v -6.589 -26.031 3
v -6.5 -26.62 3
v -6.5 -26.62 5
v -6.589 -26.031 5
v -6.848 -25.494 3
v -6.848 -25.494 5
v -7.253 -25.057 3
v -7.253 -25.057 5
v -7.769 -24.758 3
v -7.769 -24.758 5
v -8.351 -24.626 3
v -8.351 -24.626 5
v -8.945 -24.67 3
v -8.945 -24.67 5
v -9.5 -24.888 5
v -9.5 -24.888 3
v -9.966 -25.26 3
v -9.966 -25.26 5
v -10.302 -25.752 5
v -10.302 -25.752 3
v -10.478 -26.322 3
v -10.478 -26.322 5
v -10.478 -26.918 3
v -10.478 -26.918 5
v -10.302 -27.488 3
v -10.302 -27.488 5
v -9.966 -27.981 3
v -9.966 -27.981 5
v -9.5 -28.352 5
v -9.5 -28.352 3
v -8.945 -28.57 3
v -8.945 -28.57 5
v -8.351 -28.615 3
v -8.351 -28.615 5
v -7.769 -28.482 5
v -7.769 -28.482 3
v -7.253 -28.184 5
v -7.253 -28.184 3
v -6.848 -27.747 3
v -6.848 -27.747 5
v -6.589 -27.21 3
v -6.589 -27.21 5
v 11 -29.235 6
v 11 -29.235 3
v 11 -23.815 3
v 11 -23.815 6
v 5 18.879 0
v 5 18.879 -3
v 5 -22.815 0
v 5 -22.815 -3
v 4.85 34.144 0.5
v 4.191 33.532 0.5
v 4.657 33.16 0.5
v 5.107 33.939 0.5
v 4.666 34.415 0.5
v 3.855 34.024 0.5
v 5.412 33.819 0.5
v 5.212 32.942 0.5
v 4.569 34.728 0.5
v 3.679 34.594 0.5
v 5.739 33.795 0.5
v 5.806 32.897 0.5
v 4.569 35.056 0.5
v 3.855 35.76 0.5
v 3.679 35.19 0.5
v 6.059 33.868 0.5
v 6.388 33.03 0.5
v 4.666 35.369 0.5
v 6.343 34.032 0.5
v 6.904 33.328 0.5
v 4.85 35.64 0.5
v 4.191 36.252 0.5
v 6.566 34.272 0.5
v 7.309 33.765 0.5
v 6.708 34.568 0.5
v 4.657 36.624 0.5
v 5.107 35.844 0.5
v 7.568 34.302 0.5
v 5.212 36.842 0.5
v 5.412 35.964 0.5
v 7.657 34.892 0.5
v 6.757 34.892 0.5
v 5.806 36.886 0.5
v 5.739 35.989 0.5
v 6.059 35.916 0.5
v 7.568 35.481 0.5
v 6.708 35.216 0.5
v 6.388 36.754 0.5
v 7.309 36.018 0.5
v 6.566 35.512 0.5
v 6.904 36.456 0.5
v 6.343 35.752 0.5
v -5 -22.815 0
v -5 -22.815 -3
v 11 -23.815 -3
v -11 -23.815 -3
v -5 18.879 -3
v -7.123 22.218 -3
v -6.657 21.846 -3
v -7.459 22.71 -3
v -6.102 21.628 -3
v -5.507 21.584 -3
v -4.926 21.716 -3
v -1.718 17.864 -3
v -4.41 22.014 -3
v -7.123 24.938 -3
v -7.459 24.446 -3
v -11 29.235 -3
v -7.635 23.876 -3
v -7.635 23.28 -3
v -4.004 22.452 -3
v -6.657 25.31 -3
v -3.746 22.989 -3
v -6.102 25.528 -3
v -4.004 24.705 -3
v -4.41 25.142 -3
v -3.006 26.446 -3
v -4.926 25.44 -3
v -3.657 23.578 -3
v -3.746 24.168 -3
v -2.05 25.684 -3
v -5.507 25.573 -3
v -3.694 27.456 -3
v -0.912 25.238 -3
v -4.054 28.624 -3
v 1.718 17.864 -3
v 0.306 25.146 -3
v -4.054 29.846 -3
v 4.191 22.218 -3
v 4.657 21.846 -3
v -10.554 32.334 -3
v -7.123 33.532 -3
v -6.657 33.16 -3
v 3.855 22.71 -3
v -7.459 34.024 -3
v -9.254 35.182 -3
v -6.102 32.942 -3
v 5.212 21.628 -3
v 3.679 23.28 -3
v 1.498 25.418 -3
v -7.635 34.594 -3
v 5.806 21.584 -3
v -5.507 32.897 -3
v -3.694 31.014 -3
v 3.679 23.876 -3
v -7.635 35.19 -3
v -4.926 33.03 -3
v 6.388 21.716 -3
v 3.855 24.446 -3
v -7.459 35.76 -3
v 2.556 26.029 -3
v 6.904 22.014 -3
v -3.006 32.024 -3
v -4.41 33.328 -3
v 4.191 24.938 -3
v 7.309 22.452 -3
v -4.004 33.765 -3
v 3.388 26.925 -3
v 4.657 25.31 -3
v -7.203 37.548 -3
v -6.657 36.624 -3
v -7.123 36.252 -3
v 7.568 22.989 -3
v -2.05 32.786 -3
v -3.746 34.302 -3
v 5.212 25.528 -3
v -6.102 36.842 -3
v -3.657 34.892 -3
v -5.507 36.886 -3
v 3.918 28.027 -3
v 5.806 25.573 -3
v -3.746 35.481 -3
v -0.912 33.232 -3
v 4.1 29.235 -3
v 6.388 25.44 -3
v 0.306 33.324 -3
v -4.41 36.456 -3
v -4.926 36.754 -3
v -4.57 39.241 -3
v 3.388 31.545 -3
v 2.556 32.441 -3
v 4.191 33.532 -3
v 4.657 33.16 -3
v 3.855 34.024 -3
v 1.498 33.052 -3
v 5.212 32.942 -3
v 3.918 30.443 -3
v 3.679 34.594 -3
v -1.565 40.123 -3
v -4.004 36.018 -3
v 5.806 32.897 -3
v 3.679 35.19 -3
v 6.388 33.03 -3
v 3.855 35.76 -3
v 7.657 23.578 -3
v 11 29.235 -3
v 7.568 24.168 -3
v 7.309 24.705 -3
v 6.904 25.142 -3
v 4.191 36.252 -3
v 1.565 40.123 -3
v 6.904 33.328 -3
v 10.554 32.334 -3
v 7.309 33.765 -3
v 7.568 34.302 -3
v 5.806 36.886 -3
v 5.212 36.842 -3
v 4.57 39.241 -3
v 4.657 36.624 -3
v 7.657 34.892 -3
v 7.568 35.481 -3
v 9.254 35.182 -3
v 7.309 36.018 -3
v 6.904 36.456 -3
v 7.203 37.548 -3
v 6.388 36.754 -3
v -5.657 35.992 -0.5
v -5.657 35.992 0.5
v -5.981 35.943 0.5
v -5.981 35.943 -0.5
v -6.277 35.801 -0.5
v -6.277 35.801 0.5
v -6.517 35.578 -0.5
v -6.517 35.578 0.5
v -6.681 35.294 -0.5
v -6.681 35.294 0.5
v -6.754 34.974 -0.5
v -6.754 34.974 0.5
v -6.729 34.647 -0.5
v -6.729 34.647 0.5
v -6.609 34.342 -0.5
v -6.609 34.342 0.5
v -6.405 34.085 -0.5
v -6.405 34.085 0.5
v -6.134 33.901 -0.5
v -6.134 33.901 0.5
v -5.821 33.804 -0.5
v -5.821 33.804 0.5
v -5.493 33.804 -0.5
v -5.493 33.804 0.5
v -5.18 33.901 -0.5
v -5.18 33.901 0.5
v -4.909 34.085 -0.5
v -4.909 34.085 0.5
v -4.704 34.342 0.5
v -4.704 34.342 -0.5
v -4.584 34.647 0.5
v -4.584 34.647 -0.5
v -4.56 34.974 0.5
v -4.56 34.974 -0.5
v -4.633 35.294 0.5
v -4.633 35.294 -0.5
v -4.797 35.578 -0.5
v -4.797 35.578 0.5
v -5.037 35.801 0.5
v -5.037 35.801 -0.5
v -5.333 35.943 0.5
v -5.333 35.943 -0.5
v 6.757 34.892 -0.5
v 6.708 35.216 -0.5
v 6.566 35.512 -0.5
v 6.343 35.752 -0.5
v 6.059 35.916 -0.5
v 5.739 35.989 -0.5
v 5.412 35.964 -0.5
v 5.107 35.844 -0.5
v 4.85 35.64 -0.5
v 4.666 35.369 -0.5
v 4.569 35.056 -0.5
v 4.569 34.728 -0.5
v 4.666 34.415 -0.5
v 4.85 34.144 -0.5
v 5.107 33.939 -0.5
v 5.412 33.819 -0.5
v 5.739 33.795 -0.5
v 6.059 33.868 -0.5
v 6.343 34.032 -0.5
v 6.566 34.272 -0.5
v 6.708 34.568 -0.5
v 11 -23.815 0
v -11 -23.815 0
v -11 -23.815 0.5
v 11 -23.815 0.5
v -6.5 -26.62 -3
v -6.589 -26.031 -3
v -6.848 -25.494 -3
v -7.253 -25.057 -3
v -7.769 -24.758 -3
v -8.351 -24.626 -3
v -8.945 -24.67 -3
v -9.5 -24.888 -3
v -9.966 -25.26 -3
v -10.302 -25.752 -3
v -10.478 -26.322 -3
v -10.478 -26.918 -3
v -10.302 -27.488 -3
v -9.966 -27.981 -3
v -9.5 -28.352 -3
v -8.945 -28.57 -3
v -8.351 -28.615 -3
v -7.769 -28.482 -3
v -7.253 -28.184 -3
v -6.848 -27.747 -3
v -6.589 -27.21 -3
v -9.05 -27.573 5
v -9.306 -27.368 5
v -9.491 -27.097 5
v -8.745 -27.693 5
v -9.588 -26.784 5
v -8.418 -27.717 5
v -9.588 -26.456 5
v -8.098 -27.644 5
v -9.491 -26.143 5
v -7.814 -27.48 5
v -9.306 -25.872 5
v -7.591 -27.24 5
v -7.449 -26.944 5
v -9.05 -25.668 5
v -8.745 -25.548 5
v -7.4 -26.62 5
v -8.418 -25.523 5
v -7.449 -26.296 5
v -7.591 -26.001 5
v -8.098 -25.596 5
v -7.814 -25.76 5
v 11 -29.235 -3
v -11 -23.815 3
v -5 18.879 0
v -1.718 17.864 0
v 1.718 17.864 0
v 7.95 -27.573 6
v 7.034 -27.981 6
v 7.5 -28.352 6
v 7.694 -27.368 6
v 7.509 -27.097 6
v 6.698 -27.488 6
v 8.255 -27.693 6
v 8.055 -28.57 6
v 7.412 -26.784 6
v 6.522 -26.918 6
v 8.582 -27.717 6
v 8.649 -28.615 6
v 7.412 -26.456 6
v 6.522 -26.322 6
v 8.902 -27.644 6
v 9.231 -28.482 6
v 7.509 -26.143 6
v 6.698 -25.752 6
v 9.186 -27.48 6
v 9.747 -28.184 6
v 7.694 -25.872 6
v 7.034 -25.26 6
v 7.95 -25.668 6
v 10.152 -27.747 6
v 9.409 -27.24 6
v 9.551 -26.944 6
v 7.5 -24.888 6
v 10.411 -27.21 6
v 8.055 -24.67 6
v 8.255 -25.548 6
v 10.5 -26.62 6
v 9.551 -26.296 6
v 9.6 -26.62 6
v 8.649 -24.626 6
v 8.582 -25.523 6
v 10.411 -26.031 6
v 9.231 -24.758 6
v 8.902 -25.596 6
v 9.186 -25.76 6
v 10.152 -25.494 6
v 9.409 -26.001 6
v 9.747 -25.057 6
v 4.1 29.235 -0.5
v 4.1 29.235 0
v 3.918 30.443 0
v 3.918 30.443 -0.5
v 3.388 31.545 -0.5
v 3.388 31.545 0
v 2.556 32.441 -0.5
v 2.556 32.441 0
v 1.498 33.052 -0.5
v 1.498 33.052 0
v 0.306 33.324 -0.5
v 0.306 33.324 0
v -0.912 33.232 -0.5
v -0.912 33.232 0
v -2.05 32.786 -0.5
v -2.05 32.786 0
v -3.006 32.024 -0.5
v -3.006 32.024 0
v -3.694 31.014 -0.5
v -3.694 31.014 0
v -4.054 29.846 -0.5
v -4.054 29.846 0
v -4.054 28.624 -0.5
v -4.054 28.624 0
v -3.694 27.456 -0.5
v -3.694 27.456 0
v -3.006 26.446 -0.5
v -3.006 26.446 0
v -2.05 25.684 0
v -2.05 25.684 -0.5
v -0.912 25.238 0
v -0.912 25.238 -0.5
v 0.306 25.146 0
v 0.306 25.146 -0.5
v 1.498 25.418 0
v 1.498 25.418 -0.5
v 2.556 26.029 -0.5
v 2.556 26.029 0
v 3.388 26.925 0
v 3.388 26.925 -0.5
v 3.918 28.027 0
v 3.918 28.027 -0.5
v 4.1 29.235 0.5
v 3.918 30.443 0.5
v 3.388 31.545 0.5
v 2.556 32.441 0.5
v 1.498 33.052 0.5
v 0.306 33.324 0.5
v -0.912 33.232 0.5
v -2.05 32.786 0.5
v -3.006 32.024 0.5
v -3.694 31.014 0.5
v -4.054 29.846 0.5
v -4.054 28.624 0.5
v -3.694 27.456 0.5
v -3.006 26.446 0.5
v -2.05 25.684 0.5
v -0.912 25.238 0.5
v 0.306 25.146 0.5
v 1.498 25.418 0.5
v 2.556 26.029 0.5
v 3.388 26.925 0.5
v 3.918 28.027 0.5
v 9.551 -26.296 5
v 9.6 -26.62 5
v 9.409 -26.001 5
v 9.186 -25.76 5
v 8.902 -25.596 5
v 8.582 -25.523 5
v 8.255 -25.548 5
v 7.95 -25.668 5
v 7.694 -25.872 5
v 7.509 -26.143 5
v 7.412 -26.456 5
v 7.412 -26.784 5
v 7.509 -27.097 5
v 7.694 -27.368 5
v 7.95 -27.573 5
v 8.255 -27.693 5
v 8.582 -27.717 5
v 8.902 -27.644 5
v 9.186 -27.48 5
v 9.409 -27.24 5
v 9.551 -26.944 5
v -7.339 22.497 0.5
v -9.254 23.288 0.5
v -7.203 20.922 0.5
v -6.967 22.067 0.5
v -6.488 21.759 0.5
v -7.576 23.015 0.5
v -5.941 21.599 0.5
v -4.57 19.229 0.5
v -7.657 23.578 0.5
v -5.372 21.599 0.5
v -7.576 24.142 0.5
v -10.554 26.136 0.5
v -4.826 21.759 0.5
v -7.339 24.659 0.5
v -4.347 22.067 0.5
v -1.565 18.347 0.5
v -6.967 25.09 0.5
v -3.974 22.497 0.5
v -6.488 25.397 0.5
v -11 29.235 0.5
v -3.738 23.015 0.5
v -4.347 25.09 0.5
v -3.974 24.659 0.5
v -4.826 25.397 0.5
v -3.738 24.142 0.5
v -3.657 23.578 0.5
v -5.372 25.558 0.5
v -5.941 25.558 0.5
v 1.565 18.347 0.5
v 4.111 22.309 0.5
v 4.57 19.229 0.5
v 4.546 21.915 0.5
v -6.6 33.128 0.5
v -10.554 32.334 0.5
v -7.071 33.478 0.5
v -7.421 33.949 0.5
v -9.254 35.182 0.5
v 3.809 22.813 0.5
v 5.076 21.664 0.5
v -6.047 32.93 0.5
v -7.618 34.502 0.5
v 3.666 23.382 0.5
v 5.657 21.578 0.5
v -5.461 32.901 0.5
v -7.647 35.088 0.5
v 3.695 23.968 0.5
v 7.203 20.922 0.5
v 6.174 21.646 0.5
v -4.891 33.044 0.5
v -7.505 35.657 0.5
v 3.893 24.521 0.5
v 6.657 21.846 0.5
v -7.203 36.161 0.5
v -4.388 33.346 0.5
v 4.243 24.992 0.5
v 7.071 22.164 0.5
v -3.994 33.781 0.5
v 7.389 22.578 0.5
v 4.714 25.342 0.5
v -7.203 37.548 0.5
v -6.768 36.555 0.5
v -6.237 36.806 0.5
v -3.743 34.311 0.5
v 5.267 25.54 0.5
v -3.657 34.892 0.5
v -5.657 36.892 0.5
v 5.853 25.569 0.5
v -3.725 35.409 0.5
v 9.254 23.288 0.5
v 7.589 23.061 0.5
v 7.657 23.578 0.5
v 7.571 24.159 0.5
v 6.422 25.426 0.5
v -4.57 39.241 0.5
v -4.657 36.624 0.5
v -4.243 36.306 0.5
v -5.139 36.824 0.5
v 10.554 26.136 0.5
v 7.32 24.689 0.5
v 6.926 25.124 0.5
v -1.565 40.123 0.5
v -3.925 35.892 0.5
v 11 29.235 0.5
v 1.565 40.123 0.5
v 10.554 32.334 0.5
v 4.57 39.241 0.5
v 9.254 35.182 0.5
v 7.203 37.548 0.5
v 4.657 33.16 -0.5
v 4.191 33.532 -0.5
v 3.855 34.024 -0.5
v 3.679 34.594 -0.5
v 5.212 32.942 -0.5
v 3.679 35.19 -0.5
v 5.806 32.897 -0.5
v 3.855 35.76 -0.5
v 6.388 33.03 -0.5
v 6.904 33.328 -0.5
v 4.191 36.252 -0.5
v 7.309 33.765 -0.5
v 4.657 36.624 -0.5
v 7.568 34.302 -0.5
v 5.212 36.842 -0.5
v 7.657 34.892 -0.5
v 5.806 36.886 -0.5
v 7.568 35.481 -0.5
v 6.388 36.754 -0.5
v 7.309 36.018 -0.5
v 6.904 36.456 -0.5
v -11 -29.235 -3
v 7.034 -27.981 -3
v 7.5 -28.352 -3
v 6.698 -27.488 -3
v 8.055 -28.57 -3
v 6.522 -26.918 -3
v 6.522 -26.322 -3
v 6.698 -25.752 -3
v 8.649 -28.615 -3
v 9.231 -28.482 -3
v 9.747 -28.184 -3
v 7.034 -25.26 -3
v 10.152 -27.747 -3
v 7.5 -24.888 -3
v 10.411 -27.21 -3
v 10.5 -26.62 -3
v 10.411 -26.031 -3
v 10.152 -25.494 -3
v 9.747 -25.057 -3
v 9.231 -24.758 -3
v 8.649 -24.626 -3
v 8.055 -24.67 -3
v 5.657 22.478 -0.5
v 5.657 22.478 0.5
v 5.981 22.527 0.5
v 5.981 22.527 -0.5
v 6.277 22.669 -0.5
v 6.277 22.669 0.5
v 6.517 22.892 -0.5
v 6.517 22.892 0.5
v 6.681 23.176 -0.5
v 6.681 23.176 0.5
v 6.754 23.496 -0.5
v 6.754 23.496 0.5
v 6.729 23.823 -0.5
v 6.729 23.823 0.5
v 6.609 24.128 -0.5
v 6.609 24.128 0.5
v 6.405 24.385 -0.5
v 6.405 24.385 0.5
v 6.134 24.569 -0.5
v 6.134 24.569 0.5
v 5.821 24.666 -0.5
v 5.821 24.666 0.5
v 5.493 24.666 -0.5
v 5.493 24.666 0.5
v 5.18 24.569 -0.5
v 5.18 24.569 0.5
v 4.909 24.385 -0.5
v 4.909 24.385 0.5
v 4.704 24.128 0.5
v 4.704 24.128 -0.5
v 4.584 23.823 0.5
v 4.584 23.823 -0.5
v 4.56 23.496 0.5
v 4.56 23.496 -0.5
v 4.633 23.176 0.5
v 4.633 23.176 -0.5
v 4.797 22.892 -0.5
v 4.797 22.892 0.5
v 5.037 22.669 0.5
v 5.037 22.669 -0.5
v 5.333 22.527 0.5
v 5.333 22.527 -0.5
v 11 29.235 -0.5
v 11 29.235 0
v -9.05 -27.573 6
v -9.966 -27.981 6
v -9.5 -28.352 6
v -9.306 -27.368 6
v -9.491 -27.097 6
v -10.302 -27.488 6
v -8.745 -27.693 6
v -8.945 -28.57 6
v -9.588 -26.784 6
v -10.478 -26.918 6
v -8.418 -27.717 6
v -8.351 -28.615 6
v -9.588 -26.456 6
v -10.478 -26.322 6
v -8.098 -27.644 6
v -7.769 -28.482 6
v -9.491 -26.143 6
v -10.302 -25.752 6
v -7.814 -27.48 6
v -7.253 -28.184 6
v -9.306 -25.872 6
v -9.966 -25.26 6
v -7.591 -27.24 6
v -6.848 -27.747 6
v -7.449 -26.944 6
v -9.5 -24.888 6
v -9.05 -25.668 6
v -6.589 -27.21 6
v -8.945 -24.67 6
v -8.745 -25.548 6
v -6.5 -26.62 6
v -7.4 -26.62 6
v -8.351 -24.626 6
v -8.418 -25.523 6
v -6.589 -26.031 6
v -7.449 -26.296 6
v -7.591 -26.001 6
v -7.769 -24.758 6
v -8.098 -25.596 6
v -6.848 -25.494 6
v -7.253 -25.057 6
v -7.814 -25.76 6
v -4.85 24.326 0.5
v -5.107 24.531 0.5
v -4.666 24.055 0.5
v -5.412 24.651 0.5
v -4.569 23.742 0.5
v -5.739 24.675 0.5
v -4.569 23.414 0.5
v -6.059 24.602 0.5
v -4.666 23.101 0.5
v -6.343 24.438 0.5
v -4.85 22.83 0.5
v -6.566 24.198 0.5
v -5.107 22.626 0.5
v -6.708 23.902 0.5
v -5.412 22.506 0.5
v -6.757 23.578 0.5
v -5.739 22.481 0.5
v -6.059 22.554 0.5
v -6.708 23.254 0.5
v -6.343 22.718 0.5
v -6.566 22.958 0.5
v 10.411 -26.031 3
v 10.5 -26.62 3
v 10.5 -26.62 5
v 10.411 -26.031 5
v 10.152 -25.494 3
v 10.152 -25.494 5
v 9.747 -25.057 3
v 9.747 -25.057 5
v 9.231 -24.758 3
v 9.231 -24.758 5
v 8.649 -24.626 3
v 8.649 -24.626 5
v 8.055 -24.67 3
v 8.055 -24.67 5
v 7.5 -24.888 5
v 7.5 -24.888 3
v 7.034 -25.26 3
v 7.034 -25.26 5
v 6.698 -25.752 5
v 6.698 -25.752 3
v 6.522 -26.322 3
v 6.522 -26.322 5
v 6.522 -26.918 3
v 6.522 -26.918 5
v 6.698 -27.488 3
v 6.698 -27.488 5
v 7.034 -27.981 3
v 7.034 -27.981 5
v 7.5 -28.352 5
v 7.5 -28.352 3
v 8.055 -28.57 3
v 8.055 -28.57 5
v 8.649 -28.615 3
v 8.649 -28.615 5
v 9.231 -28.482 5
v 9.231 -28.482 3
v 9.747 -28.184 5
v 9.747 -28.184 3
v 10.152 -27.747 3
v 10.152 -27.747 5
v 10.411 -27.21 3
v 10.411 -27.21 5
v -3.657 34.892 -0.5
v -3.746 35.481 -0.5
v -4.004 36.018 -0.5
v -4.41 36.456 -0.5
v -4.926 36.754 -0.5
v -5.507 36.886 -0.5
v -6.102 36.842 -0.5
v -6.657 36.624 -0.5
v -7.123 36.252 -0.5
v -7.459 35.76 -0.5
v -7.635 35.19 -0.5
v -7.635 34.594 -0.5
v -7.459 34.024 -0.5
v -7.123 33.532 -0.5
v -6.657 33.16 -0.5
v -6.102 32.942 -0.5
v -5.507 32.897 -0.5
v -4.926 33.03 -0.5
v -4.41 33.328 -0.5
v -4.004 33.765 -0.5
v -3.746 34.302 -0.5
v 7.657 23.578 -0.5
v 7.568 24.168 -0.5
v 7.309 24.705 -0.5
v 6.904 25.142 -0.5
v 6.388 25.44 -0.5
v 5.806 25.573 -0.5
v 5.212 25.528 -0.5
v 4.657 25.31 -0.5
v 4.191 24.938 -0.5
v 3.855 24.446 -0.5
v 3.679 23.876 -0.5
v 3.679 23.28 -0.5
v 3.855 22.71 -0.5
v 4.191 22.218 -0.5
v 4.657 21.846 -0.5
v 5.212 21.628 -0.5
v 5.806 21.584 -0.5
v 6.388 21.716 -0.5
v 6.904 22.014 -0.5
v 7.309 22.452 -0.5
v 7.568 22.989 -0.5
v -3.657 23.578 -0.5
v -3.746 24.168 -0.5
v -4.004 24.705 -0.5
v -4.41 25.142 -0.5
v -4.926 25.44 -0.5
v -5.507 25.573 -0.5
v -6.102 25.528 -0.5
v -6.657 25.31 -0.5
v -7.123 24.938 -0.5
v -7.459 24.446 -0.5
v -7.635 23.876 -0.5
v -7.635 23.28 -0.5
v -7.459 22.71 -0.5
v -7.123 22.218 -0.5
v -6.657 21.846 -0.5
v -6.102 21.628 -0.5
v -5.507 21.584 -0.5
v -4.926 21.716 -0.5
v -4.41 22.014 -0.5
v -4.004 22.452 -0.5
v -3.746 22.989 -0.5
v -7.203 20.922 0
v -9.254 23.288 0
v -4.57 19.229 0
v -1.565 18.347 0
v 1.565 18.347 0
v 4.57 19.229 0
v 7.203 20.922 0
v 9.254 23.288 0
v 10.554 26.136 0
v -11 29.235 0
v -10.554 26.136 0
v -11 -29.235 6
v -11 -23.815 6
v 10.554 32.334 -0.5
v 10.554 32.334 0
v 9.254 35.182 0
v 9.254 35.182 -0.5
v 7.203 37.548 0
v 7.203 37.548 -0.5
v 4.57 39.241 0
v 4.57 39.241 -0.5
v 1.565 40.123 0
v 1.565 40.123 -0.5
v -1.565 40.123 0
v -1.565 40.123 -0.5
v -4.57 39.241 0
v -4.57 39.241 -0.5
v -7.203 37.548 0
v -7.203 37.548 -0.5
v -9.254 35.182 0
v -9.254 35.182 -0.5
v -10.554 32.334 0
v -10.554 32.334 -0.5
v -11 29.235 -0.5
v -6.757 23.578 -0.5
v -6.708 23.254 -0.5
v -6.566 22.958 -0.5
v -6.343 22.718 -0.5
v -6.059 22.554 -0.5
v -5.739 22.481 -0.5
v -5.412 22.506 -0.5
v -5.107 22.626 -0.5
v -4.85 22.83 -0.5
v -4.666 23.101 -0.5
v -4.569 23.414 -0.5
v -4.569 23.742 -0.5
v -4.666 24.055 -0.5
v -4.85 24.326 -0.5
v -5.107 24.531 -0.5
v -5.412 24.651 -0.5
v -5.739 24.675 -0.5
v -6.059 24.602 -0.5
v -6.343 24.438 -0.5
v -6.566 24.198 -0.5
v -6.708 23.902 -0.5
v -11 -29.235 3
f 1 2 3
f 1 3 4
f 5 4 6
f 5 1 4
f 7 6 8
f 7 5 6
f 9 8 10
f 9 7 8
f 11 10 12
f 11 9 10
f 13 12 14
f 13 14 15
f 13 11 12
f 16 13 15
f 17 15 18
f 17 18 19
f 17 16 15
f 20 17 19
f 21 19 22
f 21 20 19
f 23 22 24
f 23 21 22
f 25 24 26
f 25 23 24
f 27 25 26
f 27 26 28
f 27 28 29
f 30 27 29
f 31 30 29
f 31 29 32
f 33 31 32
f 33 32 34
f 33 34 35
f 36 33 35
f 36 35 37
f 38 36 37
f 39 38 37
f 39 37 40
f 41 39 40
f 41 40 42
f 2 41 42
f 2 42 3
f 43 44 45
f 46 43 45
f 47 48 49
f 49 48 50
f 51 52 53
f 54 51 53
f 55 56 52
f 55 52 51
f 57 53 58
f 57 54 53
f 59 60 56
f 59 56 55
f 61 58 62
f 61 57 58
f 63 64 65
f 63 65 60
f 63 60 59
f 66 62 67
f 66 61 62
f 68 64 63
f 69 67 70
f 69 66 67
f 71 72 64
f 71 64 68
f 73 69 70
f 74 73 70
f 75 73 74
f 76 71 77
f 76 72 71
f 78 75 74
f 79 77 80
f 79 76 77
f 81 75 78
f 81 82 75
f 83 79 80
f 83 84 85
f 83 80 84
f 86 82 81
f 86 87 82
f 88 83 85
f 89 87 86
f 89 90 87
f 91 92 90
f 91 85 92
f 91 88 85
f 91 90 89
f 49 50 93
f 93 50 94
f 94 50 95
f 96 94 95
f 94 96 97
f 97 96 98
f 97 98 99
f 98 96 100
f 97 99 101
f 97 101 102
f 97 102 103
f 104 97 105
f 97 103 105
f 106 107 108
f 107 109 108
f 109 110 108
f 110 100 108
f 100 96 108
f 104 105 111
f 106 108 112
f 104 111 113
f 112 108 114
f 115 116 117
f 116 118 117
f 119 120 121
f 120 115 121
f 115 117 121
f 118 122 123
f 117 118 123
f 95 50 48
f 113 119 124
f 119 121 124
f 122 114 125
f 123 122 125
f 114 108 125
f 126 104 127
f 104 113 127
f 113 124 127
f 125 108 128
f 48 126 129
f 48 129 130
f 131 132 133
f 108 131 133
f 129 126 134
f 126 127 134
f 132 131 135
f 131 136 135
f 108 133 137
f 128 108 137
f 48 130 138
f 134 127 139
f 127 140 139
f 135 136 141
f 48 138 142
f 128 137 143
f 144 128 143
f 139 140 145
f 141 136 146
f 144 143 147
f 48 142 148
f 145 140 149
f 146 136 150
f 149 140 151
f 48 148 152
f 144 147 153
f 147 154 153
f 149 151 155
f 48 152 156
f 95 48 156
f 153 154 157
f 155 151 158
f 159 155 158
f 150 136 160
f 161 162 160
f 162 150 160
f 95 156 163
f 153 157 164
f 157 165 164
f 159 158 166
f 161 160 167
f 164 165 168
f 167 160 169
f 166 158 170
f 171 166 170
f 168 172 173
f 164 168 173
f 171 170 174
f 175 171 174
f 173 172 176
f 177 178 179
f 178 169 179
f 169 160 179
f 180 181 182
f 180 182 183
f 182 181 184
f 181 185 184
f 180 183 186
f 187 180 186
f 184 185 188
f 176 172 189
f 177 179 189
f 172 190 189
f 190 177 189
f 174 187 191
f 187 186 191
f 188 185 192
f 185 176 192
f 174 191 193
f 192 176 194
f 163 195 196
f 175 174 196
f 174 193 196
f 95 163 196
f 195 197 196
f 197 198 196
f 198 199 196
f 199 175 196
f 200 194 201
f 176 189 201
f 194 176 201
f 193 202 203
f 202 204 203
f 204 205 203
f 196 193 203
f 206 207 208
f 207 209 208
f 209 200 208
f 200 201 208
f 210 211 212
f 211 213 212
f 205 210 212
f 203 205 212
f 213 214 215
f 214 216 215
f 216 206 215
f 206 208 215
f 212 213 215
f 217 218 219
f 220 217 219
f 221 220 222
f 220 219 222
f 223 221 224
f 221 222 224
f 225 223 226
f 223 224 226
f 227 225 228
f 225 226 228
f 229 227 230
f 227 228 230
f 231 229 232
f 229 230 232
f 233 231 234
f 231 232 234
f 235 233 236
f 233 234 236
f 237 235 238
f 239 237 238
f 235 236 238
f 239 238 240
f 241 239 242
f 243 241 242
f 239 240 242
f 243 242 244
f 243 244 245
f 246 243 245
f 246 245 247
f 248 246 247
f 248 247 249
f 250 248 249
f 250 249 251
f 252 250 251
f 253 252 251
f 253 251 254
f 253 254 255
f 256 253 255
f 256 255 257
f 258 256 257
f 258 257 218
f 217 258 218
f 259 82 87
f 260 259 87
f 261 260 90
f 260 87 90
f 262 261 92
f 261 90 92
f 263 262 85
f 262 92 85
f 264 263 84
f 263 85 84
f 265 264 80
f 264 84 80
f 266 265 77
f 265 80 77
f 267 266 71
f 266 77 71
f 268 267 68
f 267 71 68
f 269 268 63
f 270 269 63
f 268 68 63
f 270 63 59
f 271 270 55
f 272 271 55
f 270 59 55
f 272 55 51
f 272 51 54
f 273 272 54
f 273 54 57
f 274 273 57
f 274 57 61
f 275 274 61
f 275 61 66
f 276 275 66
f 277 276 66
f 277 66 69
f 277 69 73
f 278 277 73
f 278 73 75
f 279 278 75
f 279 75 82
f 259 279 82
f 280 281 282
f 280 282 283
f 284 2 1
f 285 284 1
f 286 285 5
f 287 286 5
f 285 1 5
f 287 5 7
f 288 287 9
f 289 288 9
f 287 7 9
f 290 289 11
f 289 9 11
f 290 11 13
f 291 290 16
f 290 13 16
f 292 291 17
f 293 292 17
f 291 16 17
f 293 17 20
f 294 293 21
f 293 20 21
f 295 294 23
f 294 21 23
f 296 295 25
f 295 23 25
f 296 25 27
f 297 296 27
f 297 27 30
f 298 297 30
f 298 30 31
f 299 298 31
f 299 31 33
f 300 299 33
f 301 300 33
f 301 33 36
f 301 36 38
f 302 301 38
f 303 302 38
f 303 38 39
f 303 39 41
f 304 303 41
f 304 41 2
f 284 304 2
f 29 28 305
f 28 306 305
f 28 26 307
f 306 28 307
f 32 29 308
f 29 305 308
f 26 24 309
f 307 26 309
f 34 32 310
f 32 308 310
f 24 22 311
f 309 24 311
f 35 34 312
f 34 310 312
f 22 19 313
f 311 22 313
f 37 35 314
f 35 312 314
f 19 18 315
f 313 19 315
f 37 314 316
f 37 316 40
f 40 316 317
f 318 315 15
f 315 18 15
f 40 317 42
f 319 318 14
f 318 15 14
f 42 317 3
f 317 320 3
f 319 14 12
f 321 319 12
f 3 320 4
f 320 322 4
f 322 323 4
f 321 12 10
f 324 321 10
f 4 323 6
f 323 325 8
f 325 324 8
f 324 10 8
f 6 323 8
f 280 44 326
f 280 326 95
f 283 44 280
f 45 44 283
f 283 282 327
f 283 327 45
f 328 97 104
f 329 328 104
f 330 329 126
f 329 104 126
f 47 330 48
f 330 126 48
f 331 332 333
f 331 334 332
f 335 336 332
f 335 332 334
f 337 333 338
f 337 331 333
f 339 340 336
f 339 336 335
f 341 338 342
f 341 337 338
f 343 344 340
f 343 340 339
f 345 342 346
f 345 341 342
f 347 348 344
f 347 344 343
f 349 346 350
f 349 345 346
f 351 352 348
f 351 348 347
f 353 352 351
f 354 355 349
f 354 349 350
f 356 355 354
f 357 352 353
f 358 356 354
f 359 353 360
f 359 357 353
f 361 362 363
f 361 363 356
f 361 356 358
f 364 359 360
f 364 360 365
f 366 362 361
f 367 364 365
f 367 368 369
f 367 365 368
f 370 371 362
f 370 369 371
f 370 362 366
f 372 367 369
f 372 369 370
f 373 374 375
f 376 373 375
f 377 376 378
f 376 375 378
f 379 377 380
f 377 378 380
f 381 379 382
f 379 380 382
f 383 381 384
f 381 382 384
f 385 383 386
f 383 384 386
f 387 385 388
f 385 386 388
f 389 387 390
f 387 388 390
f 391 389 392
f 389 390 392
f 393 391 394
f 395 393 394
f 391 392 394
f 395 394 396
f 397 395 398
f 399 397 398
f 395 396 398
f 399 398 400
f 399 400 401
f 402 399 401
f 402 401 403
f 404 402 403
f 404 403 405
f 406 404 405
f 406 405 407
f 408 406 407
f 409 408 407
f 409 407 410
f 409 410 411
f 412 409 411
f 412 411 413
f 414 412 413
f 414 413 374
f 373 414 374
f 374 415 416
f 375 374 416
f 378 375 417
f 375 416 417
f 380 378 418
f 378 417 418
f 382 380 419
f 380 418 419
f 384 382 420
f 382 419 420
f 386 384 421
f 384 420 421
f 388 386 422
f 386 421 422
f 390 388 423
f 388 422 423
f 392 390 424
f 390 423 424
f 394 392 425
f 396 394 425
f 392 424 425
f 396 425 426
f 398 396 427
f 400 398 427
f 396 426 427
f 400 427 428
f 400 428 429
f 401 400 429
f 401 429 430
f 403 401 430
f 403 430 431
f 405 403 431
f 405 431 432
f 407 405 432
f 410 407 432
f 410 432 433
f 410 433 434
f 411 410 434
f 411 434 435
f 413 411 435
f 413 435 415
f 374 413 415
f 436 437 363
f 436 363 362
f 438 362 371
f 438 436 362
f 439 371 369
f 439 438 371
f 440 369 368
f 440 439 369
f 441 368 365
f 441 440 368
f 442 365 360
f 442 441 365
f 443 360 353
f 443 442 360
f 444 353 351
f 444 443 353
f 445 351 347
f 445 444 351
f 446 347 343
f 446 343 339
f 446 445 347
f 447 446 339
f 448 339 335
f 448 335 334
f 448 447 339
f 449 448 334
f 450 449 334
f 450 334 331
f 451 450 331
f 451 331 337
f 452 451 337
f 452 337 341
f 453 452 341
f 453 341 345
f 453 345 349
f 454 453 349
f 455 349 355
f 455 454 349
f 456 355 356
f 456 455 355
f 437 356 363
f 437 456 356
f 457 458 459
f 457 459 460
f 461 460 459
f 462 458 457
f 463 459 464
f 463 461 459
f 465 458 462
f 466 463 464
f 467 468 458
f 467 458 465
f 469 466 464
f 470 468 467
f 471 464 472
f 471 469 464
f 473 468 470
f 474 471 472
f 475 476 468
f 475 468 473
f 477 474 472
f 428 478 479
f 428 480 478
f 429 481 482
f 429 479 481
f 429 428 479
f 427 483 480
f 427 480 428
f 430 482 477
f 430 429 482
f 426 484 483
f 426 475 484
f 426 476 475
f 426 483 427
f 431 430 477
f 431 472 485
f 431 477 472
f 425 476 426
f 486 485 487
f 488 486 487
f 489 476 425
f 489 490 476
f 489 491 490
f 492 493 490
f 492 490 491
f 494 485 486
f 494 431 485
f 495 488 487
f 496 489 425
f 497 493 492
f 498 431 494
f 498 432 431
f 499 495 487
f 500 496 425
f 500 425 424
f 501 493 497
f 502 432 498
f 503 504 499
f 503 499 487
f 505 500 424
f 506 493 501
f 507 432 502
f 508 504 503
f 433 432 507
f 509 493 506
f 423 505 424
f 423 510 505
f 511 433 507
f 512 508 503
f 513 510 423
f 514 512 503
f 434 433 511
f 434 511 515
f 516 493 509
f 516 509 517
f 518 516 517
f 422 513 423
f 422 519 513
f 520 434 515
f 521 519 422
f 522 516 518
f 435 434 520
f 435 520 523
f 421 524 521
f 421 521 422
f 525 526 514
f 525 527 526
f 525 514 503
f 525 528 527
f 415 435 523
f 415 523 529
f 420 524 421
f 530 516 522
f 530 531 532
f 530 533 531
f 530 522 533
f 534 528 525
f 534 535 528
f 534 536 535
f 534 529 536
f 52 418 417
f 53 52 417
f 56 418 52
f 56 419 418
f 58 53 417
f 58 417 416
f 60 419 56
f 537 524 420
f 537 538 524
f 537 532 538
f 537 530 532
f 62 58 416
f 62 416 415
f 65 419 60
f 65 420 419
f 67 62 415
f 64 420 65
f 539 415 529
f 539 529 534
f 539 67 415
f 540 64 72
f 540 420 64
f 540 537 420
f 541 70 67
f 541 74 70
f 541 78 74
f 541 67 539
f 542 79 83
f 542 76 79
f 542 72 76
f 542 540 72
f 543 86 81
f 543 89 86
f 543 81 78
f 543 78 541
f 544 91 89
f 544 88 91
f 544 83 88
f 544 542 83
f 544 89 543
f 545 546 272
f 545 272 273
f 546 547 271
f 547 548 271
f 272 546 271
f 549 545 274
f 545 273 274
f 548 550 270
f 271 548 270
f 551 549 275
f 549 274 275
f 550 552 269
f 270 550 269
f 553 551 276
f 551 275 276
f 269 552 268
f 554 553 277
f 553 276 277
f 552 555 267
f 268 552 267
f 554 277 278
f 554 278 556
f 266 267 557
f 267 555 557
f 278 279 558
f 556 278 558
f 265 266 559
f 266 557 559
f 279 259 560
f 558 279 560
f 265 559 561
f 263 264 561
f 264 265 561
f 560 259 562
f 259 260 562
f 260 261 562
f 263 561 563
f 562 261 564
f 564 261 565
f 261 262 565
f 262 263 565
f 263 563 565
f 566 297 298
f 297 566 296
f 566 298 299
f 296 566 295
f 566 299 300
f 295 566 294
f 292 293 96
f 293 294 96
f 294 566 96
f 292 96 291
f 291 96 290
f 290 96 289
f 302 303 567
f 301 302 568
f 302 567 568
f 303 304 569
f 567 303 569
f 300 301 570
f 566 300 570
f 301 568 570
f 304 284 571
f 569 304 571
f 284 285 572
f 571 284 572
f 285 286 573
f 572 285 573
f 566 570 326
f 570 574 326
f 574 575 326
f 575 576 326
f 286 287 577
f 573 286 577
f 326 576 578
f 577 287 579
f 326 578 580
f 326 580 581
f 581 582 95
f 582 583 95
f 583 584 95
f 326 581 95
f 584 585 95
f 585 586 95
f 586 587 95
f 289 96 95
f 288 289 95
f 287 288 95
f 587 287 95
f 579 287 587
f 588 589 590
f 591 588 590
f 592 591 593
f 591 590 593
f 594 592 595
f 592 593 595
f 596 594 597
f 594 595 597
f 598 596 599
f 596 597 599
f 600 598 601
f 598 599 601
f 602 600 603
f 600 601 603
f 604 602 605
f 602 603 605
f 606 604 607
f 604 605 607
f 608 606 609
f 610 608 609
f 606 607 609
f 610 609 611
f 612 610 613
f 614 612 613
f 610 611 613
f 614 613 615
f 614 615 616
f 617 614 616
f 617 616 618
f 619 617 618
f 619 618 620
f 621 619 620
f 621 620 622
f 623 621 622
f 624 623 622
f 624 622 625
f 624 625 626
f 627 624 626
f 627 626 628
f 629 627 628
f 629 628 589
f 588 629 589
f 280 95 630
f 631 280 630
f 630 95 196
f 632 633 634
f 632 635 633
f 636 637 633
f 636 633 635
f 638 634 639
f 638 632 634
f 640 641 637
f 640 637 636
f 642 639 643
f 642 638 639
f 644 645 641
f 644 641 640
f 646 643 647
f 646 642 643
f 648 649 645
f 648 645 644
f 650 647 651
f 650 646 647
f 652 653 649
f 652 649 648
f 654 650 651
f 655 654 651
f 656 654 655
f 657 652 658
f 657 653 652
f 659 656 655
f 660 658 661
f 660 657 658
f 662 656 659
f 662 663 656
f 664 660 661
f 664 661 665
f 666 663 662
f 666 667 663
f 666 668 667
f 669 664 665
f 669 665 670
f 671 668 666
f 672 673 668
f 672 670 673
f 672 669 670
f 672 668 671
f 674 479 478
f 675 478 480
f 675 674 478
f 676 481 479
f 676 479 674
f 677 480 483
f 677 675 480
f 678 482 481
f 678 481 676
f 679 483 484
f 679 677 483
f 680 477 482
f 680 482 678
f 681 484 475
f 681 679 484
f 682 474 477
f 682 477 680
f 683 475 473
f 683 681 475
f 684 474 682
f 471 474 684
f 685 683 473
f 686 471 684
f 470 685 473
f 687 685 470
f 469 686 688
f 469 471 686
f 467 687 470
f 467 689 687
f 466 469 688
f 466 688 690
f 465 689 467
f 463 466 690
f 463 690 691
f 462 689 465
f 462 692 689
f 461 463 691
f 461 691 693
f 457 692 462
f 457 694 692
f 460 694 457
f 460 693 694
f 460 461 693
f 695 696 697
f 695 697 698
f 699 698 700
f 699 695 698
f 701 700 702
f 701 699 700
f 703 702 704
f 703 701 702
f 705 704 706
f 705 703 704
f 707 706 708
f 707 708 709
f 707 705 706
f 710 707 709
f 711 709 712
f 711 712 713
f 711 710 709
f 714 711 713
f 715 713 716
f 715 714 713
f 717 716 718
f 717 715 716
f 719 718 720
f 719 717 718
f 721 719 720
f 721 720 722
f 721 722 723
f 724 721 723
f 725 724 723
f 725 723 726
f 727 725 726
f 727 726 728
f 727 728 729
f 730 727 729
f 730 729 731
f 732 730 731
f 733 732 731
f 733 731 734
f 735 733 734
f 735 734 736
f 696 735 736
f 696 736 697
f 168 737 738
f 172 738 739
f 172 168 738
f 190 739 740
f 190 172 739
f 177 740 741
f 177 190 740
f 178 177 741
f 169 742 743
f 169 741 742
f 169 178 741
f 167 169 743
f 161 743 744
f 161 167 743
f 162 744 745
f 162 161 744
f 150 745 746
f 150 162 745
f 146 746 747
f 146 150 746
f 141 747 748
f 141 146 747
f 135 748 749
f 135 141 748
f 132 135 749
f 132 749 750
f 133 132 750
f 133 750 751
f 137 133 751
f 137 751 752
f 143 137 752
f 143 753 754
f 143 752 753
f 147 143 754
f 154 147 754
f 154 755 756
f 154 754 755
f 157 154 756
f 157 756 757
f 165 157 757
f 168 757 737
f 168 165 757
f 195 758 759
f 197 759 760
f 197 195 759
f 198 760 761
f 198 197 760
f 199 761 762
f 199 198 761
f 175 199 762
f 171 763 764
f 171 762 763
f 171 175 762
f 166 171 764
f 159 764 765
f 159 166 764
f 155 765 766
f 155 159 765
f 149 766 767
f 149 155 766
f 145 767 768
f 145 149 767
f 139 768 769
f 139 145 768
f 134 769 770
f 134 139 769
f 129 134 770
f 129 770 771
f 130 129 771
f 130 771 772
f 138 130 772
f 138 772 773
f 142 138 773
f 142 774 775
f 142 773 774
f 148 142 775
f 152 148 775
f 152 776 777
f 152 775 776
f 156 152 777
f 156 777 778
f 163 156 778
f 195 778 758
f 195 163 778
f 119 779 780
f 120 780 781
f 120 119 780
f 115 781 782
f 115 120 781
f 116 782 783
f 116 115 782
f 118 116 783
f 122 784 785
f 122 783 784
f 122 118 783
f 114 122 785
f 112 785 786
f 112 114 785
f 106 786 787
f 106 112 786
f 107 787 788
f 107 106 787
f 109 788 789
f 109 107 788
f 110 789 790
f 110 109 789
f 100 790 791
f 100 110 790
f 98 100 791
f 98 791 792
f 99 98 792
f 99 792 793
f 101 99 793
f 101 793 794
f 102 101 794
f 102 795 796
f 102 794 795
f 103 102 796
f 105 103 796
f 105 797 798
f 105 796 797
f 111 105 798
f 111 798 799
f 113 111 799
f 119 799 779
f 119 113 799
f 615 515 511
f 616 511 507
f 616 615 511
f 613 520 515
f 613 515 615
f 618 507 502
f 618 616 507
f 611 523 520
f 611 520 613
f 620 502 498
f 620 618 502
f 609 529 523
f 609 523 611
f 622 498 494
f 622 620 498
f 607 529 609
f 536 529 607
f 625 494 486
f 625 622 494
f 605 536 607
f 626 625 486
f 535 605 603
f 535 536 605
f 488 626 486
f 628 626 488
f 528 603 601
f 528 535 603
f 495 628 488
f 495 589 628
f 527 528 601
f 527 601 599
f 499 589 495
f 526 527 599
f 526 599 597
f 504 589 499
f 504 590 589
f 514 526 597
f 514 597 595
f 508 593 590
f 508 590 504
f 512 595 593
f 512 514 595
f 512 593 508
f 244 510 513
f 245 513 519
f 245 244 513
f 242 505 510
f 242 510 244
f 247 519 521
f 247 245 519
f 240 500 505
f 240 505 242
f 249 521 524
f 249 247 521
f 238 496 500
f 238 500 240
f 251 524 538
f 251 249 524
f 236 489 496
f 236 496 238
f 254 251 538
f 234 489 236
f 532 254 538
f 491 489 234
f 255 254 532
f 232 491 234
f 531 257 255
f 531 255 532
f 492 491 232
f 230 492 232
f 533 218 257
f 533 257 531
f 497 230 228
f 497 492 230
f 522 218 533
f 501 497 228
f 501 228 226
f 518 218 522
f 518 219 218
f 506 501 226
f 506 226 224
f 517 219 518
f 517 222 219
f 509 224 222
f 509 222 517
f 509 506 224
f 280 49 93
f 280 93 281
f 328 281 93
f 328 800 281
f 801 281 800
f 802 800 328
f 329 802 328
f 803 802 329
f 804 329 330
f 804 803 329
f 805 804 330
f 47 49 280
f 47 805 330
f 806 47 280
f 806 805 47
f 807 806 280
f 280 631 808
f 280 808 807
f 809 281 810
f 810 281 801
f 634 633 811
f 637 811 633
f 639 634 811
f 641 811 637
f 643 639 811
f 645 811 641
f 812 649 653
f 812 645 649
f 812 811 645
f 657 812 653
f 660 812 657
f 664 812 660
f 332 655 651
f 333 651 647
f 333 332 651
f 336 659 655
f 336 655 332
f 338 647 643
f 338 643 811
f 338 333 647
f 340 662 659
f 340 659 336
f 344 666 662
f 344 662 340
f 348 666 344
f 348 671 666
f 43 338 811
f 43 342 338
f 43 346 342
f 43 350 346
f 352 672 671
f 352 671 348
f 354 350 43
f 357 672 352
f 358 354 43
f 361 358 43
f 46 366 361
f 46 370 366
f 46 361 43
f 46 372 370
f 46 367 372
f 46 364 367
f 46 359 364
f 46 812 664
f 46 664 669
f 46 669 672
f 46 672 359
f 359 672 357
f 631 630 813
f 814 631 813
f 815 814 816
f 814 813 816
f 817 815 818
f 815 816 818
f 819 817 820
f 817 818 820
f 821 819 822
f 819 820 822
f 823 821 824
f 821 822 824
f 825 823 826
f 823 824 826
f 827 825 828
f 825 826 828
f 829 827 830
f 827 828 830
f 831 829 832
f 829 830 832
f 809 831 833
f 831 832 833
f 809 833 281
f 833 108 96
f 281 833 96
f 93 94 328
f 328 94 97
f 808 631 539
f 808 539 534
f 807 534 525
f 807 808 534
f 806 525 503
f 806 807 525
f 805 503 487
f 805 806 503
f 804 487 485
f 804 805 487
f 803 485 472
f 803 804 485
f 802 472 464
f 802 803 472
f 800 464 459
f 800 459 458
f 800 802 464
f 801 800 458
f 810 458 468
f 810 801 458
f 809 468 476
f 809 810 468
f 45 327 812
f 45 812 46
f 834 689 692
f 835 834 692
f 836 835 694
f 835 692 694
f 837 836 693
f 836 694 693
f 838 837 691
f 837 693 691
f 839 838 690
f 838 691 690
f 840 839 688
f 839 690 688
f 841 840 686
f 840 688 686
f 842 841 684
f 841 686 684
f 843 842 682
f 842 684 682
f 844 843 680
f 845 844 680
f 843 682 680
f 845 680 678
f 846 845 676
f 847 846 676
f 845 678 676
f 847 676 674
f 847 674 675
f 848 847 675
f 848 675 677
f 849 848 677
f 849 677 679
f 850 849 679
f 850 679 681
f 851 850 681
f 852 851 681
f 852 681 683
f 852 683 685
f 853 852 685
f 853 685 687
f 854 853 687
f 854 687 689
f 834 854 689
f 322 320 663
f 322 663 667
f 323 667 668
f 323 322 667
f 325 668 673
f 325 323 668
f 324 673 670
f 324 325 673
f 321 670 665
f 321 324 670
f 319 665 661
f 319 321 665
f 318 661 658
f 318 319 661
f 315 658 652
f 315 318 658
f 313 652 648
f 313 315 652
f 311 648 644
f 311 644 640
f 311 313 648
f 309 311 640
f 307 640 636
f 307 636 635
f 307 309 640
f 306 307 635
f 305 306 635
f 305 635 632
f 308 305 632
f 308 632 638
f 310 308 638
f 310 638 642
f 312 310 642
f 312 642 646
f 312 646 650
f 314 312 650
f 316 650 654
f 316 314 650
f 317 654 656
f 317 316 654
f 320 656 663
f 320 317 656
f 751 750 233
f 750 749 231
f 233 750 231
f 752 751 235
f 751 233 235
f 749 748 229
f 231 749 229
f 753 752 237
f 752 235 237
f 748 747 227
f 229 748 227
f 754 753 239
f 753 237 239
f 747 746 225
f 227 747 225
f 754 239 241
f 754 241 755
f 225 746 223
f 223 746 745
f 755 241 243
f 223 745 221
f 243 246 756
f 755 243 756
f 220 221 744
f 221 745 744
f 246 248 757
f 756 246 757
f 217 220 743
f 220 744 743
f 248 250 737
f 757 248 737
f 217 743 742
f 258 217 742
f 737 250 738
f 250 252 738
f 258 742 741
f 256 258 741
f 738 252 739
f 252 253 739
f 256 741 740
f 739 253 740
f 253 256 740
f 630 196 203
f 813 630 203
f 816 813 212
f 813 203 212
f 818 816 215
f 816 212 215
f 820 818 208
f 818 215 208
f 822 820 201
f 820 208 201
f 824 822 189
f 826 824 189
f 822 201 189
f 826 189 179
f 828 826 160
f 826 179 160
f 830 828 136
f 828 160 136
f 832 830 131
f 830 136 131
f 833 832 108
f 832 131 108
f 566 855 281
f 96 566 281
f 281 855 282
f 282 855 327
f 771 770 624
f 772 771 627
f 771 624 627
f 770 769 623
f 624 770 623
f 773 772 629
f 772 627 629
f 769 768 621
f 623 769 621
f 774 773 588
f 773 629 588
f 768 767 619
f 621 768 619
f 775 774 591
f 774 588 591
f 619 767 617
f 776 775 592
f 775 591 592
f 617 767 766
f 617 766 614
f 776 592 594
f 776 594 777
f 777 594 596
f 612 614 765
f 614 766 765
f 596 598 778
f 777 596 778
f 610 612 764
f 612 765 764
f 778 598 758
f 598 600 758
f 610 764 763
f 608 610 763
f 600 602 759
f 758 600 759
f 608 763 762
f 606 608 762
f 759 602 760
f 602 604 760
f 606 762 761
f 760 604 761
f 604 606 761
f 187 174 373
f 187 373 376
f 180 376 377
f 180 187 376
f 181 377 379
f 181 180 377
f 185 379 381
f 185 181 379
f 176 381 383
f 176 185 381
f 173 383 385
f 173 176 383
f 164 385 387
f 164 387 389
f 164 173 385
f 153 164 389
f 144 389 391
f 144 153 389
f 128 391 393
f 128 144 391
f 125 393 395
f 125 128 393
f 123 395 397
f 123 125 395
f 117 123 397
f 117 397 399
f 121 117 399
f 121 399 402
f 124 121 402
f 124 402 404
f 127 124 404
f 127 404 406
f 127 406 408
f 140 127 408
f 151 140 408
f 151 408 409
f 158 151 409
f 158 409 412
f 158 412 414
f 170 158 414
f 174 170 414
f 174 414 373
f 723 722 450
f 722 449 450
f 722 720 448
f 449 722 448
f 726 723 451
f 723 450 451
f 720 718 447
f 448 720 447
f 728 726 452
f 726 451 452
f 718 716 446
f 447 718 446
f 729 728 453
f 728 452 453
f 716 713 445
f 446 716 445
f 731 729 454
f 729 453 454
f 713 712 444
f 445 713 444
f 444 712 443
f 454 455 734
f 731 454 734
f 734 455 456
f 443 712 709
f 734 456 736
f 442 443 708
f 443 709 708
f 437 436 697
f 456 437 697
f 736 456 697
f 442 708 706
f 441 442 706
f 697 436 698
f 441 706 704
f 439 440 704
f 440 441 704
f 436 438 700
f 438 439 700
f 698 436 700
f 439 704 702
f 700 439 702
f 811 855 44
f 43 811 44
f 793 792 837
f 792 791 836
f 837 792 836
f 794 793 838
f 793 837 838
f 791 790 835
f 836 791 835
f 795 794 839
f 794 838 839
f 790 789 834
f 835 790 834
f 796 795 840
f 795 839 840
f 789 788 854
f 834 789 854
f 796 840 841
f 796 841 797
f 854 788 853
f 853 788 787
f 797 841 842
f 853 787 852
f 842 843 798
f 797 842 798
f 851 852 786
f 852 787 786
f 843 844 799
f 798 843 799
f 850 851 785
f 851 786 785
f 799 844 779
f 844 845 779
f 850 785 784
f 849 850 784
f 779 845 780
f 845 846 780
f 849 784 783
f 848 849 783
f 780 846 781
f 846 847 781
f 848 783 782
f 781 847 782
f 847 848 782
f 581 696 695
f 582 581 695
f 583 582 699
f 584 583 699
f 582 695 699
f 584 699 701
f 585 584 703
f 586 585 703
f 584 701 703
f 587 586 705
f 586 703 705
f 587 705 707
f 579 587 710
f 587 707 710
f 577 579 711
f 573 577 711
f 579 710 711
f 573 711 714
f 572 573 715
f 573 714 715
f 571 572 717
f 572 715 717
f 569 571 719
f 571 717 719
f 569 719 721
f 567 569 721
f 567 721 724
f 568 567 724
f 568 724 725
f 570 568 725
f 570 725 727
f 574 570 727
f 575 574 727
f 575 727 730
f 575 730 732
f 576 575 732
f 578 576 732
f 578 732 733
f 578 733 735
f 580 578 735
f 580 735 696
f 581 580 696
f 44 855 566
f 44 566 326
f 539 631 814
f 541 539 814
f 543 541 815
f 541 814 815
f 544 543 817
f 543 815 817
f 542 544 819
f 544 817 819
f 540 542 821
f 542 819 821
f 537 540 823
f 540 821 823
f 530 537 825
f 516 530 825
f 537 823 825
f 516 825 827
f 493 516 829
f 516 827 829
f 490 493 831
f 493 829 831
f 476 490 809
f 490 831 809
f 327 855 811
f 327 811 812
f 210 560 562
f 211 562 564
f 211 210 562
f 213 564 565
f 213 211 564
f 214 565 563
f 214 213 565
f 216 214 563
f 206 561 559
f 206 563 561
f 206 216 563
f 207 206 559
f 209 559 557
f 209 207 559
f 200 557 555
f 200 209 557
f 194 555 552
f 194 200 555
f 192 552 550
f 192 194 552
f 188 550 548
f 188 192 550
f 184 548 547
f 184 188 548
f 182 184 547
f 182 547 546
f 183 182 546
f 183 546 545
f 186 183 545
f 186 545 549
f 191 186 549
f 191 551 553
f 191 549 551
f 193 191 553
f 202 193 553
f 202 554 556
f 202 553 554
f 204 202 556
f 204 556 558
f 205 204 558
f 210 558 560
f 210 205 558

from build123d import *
from build123d.topology import SkipClean

# Parameters (mm, degrees)
BOSS_EXTRUDE1_DEPTH           = 3
BOSS_EXTRUDE2_START           = -0.5
SKETCH1_3_R                   = 11
BOSS_EXTRUDE2_DEPTH           = 0.5
SKETCH2_R                     = 4.1
SKETCH2_R_2                   = 1.1
CUT_EXTRUDE1_DEPTH            = 3.5
SKETCH2_3_R                   = 2
CUT_EXTRUDE2_DEPTH            = 2.5
CIRPATTERN2_COUNT             = 4
SKETCH1_6_W                   = 11
SKETCH1_6_H                   = 5.42
BOSS_EXTRUDE3_DEPTH           = 6
SKETCH3_R                     = 1.1
CUT_EXTRUDE3_DEPTH            = 9
SKETCH3_3_R                   = 2
SKETCH3_3_R_2                 = 1.1
CUT_EXTRUDE4_DEPTH            = 8
BODY_MOVE_COPY1_START         = -3
BODY_MOVE_COPY1_OUTLINE_R     = 2
BODY_MOVE_COPY1_OUTLINE_R_2   = 4.1
BODY_MOVE_COPY1_DEPTH         = 3
BODY_MOVE_COPY1_START_2       = 3
BODY_MOVE_COPY1_2_OUTLINE_W   = 22
BODY_MOVE_COPY1_2_OUTLINE_H   = 5.42
BODY_MOVE_COPY1_2_OUTLINE_R   = 2
BODY_MOVE_COPY1_2_DEPTH       = 3
BODY_MOVE_COPY1_START_3       = 5
BODY_MOVE_COPY1_3_OUTLINE_R   = 2
BODY_MOVE_COPY1_3_OUTLINE_R_2 = 1.1
BODY_MOVE_COPY1_3_DEPTH       = 1
BODY_MOVE_COPY1_START_4       = 0.5
BODY_MOVE_COPY1_4_OUTLINE_R   = 2
BODY_MOVE_COPY1_4_OUTLINE_R_2 = 4.1
BODY_MOVE_COPY1_4_DEPTH       = 2.5
BODY_MOVE_COPY1_START_5       = -6
BODY_MOVE_COPY1_5_OUTLINE_W   = 22
BODY_MOVE_COPY1_5_OUTLINE_H   = 5.42
BODY_MOVE_COPY1_5_OUTLINE_R   = 1.1
BODY_MOVE_COPY1_5_DEPTH       = 3
BODY_MOVE_COPY1_6_DEPTH       = 0.5


# Read off the part's stored shape, not the designer's step: Body-Move/Copy1
with BuildPart() as part:
    # Sketch1 → Boss-Extrude1 (new body)
    with BuildSketch(Plane.XY):
        with BuildLine():
            Line((-11, 29.235), (-11, -29.235))
            Line((-11, -29.235), (11, -29.235))
            Line((11, -29.235), (11, 29.235))
            ThreePointArc((11, 29.235), (0, 40.235), (-11, 29.235))
        make_face()
        with BuildLine():
            Line((5, -22.815), (-5, -22.815))
            Line((-5, -22.815), (-5, 18.878842411))
            ThreePointArc((-5, 18.878842411), (0, 17.735), (5, 18.878842411))
            Line((5, 18.878842411), (5, -22.815))
        make_face(mode=Mode.SUBTRACT)
    extrude(amount=BOSS_EXTRUDE1_DEPTH)

    # Sketch1<3> → Boss-Extrude2 (add)
    with BuildSketch(Plane.XY.offset(BOSS_EXTRUDE2_START)):
        with Locations((0, 29.235)):
            Circle(SKETCH1_3_R)
    extrude(amount=BOSS_EXTRUDE2_DEPTH)

    # Sketch2 → Cut-Extrude1 (cut)
    with BuildSketch(Plane.XY.offset(3)):
        with Locations((0, 29.235)):
            Circle(SKETCH2_R)
        with Locations((5.656854249, 34.891854249)):
            Circle(SKETCH2_R_2)
    cut_extrude1 = extrude(amount=-CUT_EXTRUDE1_DEPTH, mode=Mode.SUBTRACT)

    # Sketch2<3> → Cut-Extrude2 (cut)
    with BuildSketch(Plane.XY.offset(3)):
        with Locations((5.656854249, 34.891854249)):
            Circle(SKETCH2_3_R)
    cut_extrude2 = extrude(amount=-CUT_EXTRUDE2_DEPTH, mode=Mode.SUBTRACT)

    # CirPattern2: Cut-Extrude1, Cut-Extrude2 ×4 about axis
    cirpattern2_axis = Axis((0, 29.235, 0), (0, 0, 1))
    add([cut_extrude1.rotate(cirpattern2_axis, i * 360 / CIRPATTERN2_COUNT) for i in range(1, CIRPATTERN2_COUNT)], mode=Mode.SUBTRACT)
    add([cut_extrude2.rotate(cirpattern2_axis, i * 360 / CIRPATTERN2_COUNT) for i in range(1, CIRPATTERN2_COUNT)], mode=Mode.SUBTRACT)

    # Sketch1<6> → Boss-Extrude3 (add)
    with BuildSketch(Plane.XY):
        with Locations((-5.5, -26.525)):
            Rectangle(SKETCH1_6_W, SKETCH1_6_H)
        with Locations((5.5, -26.525)):
            Rectangle(SKETCH1_6_W, SKETCH1_6_H)
    extrude(amount=-BOSS_EXTRUDE3_DEPTH)

    # Sketch3 → Cut-Extrude3 (cut)
    with BuildSketch(Plane.XY.offset(3)):
        with Locations((-8.5, -26.62018786)):
            Circle(SKETCH3_R)
        with Locations((8.5, -26.62018786)):
            Circle(SKETCH3_R)
    extrude(amount=-CUT_EXTRUDE3_DEPTH, mode=Mode.SUBTRACT)

    # Sketch3<3> → Cut-Extrude4 (cut)
    # profile 1 of 2: a face of its own
    with BuildSketch(Plane.XY.offset(3)):
        with Locations((-8.5, -26.62018786)):
            Circle(SKETCH3_3_R)
        with Locations((-8.5, -26.62018786)):
            Circle(SKETCH3_3_R_2, mode=Mode.SUBTRACT)
    # profile 2 of 2: a face of its own
    with BuildSketch(Plane.XY.offset(3)):
        with Locations((8.5, -26.62018786)):
            Circle(SKETCH3_3_R)
        with Locations((8.5, -26.62018786)):
            Circle(SKETCH3_3_R_2, mode=Mode.SUBTRACT)
    extrude(amount=-CUT_EXTRUDE4_DEPTH, mode=Mode.SUBTRACT)

    # Body-Move/Copy1 outline → Body-Move/Copy1 (add)
    with BuildSketch(Plane.XY.offset(BODY_MOVE_COPY1_START)):
        with BuildLine():
            Line((-11, -23.815), (11, -23.815))
            Line((11, -23.815), (11, 29.235))
            ThreePointArc((11, 29.235), (0, 40.235), (-11, 29.235))
            Line((-11, 29.235), (-11, -23.815))
        make_face()
        with BuildLine():
            Line((5, 18.878842411), (5, -22.815))
            Line((5, -22.815), (-5, -22.815))
            Line((-5, -22.815), (-5, 18.878842411))
            ThreePointArc((-5, 18.878842411), (0, 17.735), (5, 18.878842411))
        make_face(mode=Mode.SUBTRACT)
        with Locations((5.656854249, 34.891854249)):
            Circle(BODY_MOVE_COPY1_OUTLINE_R, mode=Mode.SUBTRACT)
        with Locations((-5.656854249, 23.578145751)):
            Circle(BODY_MOVE_COPY1_OUTLINE_R, mode=Mode.SUBTRACT)
        with Locations((-5.656854249, 34.891854249)):
            Circle(BODY_MOVE_COPY1_OUTLINE_R, mode=Mode.SUBTRACT)
        with Locations((0, 29.235)):
            Circle(BODY_MOVE_COPY1_OUTLINE_R_2, mode=Mode.SUBTRACT)
        with Locations((5.656854249, 23.578145751)):
            Circle(BODY_MOVE_COPY1_OUTLINE_R, mode=Mode.SUBTRACT)
    extrude(amount=BODY_MOVE_COPY1_DEPTH)

    # Body-Move_Copy1 2 outline → Body-Move_Copy1 2 (add)
    with BuildSketch(Plane.XY.offset(BODY_MOVE_COPY1_START_2)):
        with Locations((0, -26.525)):
            Rectangle(BODY_MOVE_COPY1_2_OUTLINE_W, BODY_MOVE_COPY1_2_OUTLINE_H)
        with Locations((-8.5, -26.62018786)):
            Circle(BODY_MOVE_COPY1_2_OUTLINE_R, mode=Mode.SUBTRACT)
        with Locations((8.5, -26.62018786)):
            Circle(BODY_MOVE_COPY1_2_OUTLINE_R, mode=Mode.SUBTRACT)
    extrude(amount=BODY_MOVE_COPY1_2_DEPTH)

    # Body-Move_Copy1 3 outline → Body-Move_Copy1 3 (add)
    # profile 1 of 2: a face of its own
    with BuildSketch(Plane.XY.offset(BODY_MOVE_COPY1_START_3)):
        with Locations((-8.5, -26.62018786)):
            Circle(BODY_MOVE_COPY1_3_OUTLINE_R)
        with Locations((-8.5, -26.62018786)):
            Circle(BODY_MOVE_COPY1_3_OUTLINE_R_2, mode=Mode.SUBTRACT)
    # profile 2 of 2: a face of its own
    with BuildSketch(Plane.XY.offset(BODY_MOVE_COPY1_START_3)):
        with Locations((8.5, -26.62018786)):
            Circle(BODY_MOVE_COPY1_3_OUTLINE_R)
        with Locations((8.5, -26.62018786)):
            Circle(BODY_MOVE_COPY1_3_OUTLINE_R_2, mode=Mode.SUBTRACT)
    extrude(amount=BODY_MOVE_COPY1_3_DEPTH)

    # Body-Move_Copy1 4 outline → Body-Move_Copy1 4 (cut)
    with BuildSketch(Plane.XY.offset(BODY_MOVE_COPY1_START_4)):
        with BuildLine():
            Line((-11, -23.815), (11, -23.815))
            Line((11, -23.815), (11, 29.235))
            ThreePointArc((11, 29.235), (0, 40.235), (-11, 29.235))
            Line((-11, 29.235), (-11, -23.815))
        make_face()
        with BuildLine():
            Line((5, 18.878842411), (5, -22.815))
            Line((5, -22.815), (-5, -22.815))
            Line((-5, -22.815), (-5, 18.878842411))
            ThreePointArc((-5, 18.878842411), (0, 17.735), (5, 18.878842411))
        make_face(mode=Mode.SUBTRACT)
        with Locations((5.656854249, 34.891854249)):
            Circle(BODY_MOVE_COPY1_4_OUTLINE_R, mode=Mode.SUBTRACT)
        with Locations((-5.656854249, 23.578145751)):
            Circle(BODY_MOVE_COPY1_4_OUTLINE_R, mode=Mode.SUBTRACT)
        with Locations((-5.656854249, 34.891854249)):
            Circle(BODY_MOVE_COPY1_4_OUTLINE_R, mode=Mode.SUBTRACT)
        with Locations((0, 29.235)):
            Circle(BODY_MOVE_COPY1_4_OUTLINE_R_2, mode=Mode.SUBTRACT)
        with Locations((5.656854249, 23.578145751)):
            Circle(BODY_MOVE_COPY1_4_OUTLINE_R, mode=Mode.SUBTRACT)
    extrude(amount=BODY_MOVE_COPY1_4_DEPTH, mode=Mode.SUBTRACT)

    # Body-Move_Copy1 5 outline → Body-Move_Copy1 5 (cut)
    with BuildSketch(Plane.XY.offset(BODY_MOVE_COPY1_START_5)):
        with Locations((0, -26.525)):
            Rectangle(BODY_MOVE_COPY1_5_OUTLINE_W, BODY_MOVE_COPY1_5_OUTLINE_H)
        with Locations((-8.5, -26.62018786)):
            Circle(BODY_MOVE_COPY1_5_OUTLINE_R, mode=Mode.SUBTRACT)
        with Locations((8.5, -26.62018786)):
            Circle(BODY_MOVE_COPY1_5_OUTLINE_R, mode=Mode.SUBTRACT)
    extrude(amount=BODY_MOVE_COPY1_5_DEPTH, mode=Mode.SUBTRACT)

    # Body-Move_Copy1 6 outline → Body-Move_Copy1 6 (cut)
    with SkipClean():  # the faces are left unmerged after this step: merging them gives an invalid solid
        with BuildSketch(Plane.XY):
            with BuildLine():
                Line((-11, -23.815), (11, -23.815))
                Line((11, -23.815), (11, 29.235))
                ThreePointArc((11, 29.235), (0, 18.235), (-11, 29.235))
                Line((-11, 29.235), (-11, -23.815))
            make_face()
            with BuildLine():
                Line((5, 18.878842411), (5, -22.815))
                Line((5, -22.815), (-5, -22.815))
                Line((-5, -22.815), (-5, 18.878842411))
                ThreePointArc((-5, 18.878842411), (0, 17.735), (5, 18.878842411))
            make_face(mode=Mode.SUBTRACT)
        extrude(amount=BODY_MOVE_COPY1_6_DEPTH, mode=Mode.SUBTRACT)


solid = part.part
